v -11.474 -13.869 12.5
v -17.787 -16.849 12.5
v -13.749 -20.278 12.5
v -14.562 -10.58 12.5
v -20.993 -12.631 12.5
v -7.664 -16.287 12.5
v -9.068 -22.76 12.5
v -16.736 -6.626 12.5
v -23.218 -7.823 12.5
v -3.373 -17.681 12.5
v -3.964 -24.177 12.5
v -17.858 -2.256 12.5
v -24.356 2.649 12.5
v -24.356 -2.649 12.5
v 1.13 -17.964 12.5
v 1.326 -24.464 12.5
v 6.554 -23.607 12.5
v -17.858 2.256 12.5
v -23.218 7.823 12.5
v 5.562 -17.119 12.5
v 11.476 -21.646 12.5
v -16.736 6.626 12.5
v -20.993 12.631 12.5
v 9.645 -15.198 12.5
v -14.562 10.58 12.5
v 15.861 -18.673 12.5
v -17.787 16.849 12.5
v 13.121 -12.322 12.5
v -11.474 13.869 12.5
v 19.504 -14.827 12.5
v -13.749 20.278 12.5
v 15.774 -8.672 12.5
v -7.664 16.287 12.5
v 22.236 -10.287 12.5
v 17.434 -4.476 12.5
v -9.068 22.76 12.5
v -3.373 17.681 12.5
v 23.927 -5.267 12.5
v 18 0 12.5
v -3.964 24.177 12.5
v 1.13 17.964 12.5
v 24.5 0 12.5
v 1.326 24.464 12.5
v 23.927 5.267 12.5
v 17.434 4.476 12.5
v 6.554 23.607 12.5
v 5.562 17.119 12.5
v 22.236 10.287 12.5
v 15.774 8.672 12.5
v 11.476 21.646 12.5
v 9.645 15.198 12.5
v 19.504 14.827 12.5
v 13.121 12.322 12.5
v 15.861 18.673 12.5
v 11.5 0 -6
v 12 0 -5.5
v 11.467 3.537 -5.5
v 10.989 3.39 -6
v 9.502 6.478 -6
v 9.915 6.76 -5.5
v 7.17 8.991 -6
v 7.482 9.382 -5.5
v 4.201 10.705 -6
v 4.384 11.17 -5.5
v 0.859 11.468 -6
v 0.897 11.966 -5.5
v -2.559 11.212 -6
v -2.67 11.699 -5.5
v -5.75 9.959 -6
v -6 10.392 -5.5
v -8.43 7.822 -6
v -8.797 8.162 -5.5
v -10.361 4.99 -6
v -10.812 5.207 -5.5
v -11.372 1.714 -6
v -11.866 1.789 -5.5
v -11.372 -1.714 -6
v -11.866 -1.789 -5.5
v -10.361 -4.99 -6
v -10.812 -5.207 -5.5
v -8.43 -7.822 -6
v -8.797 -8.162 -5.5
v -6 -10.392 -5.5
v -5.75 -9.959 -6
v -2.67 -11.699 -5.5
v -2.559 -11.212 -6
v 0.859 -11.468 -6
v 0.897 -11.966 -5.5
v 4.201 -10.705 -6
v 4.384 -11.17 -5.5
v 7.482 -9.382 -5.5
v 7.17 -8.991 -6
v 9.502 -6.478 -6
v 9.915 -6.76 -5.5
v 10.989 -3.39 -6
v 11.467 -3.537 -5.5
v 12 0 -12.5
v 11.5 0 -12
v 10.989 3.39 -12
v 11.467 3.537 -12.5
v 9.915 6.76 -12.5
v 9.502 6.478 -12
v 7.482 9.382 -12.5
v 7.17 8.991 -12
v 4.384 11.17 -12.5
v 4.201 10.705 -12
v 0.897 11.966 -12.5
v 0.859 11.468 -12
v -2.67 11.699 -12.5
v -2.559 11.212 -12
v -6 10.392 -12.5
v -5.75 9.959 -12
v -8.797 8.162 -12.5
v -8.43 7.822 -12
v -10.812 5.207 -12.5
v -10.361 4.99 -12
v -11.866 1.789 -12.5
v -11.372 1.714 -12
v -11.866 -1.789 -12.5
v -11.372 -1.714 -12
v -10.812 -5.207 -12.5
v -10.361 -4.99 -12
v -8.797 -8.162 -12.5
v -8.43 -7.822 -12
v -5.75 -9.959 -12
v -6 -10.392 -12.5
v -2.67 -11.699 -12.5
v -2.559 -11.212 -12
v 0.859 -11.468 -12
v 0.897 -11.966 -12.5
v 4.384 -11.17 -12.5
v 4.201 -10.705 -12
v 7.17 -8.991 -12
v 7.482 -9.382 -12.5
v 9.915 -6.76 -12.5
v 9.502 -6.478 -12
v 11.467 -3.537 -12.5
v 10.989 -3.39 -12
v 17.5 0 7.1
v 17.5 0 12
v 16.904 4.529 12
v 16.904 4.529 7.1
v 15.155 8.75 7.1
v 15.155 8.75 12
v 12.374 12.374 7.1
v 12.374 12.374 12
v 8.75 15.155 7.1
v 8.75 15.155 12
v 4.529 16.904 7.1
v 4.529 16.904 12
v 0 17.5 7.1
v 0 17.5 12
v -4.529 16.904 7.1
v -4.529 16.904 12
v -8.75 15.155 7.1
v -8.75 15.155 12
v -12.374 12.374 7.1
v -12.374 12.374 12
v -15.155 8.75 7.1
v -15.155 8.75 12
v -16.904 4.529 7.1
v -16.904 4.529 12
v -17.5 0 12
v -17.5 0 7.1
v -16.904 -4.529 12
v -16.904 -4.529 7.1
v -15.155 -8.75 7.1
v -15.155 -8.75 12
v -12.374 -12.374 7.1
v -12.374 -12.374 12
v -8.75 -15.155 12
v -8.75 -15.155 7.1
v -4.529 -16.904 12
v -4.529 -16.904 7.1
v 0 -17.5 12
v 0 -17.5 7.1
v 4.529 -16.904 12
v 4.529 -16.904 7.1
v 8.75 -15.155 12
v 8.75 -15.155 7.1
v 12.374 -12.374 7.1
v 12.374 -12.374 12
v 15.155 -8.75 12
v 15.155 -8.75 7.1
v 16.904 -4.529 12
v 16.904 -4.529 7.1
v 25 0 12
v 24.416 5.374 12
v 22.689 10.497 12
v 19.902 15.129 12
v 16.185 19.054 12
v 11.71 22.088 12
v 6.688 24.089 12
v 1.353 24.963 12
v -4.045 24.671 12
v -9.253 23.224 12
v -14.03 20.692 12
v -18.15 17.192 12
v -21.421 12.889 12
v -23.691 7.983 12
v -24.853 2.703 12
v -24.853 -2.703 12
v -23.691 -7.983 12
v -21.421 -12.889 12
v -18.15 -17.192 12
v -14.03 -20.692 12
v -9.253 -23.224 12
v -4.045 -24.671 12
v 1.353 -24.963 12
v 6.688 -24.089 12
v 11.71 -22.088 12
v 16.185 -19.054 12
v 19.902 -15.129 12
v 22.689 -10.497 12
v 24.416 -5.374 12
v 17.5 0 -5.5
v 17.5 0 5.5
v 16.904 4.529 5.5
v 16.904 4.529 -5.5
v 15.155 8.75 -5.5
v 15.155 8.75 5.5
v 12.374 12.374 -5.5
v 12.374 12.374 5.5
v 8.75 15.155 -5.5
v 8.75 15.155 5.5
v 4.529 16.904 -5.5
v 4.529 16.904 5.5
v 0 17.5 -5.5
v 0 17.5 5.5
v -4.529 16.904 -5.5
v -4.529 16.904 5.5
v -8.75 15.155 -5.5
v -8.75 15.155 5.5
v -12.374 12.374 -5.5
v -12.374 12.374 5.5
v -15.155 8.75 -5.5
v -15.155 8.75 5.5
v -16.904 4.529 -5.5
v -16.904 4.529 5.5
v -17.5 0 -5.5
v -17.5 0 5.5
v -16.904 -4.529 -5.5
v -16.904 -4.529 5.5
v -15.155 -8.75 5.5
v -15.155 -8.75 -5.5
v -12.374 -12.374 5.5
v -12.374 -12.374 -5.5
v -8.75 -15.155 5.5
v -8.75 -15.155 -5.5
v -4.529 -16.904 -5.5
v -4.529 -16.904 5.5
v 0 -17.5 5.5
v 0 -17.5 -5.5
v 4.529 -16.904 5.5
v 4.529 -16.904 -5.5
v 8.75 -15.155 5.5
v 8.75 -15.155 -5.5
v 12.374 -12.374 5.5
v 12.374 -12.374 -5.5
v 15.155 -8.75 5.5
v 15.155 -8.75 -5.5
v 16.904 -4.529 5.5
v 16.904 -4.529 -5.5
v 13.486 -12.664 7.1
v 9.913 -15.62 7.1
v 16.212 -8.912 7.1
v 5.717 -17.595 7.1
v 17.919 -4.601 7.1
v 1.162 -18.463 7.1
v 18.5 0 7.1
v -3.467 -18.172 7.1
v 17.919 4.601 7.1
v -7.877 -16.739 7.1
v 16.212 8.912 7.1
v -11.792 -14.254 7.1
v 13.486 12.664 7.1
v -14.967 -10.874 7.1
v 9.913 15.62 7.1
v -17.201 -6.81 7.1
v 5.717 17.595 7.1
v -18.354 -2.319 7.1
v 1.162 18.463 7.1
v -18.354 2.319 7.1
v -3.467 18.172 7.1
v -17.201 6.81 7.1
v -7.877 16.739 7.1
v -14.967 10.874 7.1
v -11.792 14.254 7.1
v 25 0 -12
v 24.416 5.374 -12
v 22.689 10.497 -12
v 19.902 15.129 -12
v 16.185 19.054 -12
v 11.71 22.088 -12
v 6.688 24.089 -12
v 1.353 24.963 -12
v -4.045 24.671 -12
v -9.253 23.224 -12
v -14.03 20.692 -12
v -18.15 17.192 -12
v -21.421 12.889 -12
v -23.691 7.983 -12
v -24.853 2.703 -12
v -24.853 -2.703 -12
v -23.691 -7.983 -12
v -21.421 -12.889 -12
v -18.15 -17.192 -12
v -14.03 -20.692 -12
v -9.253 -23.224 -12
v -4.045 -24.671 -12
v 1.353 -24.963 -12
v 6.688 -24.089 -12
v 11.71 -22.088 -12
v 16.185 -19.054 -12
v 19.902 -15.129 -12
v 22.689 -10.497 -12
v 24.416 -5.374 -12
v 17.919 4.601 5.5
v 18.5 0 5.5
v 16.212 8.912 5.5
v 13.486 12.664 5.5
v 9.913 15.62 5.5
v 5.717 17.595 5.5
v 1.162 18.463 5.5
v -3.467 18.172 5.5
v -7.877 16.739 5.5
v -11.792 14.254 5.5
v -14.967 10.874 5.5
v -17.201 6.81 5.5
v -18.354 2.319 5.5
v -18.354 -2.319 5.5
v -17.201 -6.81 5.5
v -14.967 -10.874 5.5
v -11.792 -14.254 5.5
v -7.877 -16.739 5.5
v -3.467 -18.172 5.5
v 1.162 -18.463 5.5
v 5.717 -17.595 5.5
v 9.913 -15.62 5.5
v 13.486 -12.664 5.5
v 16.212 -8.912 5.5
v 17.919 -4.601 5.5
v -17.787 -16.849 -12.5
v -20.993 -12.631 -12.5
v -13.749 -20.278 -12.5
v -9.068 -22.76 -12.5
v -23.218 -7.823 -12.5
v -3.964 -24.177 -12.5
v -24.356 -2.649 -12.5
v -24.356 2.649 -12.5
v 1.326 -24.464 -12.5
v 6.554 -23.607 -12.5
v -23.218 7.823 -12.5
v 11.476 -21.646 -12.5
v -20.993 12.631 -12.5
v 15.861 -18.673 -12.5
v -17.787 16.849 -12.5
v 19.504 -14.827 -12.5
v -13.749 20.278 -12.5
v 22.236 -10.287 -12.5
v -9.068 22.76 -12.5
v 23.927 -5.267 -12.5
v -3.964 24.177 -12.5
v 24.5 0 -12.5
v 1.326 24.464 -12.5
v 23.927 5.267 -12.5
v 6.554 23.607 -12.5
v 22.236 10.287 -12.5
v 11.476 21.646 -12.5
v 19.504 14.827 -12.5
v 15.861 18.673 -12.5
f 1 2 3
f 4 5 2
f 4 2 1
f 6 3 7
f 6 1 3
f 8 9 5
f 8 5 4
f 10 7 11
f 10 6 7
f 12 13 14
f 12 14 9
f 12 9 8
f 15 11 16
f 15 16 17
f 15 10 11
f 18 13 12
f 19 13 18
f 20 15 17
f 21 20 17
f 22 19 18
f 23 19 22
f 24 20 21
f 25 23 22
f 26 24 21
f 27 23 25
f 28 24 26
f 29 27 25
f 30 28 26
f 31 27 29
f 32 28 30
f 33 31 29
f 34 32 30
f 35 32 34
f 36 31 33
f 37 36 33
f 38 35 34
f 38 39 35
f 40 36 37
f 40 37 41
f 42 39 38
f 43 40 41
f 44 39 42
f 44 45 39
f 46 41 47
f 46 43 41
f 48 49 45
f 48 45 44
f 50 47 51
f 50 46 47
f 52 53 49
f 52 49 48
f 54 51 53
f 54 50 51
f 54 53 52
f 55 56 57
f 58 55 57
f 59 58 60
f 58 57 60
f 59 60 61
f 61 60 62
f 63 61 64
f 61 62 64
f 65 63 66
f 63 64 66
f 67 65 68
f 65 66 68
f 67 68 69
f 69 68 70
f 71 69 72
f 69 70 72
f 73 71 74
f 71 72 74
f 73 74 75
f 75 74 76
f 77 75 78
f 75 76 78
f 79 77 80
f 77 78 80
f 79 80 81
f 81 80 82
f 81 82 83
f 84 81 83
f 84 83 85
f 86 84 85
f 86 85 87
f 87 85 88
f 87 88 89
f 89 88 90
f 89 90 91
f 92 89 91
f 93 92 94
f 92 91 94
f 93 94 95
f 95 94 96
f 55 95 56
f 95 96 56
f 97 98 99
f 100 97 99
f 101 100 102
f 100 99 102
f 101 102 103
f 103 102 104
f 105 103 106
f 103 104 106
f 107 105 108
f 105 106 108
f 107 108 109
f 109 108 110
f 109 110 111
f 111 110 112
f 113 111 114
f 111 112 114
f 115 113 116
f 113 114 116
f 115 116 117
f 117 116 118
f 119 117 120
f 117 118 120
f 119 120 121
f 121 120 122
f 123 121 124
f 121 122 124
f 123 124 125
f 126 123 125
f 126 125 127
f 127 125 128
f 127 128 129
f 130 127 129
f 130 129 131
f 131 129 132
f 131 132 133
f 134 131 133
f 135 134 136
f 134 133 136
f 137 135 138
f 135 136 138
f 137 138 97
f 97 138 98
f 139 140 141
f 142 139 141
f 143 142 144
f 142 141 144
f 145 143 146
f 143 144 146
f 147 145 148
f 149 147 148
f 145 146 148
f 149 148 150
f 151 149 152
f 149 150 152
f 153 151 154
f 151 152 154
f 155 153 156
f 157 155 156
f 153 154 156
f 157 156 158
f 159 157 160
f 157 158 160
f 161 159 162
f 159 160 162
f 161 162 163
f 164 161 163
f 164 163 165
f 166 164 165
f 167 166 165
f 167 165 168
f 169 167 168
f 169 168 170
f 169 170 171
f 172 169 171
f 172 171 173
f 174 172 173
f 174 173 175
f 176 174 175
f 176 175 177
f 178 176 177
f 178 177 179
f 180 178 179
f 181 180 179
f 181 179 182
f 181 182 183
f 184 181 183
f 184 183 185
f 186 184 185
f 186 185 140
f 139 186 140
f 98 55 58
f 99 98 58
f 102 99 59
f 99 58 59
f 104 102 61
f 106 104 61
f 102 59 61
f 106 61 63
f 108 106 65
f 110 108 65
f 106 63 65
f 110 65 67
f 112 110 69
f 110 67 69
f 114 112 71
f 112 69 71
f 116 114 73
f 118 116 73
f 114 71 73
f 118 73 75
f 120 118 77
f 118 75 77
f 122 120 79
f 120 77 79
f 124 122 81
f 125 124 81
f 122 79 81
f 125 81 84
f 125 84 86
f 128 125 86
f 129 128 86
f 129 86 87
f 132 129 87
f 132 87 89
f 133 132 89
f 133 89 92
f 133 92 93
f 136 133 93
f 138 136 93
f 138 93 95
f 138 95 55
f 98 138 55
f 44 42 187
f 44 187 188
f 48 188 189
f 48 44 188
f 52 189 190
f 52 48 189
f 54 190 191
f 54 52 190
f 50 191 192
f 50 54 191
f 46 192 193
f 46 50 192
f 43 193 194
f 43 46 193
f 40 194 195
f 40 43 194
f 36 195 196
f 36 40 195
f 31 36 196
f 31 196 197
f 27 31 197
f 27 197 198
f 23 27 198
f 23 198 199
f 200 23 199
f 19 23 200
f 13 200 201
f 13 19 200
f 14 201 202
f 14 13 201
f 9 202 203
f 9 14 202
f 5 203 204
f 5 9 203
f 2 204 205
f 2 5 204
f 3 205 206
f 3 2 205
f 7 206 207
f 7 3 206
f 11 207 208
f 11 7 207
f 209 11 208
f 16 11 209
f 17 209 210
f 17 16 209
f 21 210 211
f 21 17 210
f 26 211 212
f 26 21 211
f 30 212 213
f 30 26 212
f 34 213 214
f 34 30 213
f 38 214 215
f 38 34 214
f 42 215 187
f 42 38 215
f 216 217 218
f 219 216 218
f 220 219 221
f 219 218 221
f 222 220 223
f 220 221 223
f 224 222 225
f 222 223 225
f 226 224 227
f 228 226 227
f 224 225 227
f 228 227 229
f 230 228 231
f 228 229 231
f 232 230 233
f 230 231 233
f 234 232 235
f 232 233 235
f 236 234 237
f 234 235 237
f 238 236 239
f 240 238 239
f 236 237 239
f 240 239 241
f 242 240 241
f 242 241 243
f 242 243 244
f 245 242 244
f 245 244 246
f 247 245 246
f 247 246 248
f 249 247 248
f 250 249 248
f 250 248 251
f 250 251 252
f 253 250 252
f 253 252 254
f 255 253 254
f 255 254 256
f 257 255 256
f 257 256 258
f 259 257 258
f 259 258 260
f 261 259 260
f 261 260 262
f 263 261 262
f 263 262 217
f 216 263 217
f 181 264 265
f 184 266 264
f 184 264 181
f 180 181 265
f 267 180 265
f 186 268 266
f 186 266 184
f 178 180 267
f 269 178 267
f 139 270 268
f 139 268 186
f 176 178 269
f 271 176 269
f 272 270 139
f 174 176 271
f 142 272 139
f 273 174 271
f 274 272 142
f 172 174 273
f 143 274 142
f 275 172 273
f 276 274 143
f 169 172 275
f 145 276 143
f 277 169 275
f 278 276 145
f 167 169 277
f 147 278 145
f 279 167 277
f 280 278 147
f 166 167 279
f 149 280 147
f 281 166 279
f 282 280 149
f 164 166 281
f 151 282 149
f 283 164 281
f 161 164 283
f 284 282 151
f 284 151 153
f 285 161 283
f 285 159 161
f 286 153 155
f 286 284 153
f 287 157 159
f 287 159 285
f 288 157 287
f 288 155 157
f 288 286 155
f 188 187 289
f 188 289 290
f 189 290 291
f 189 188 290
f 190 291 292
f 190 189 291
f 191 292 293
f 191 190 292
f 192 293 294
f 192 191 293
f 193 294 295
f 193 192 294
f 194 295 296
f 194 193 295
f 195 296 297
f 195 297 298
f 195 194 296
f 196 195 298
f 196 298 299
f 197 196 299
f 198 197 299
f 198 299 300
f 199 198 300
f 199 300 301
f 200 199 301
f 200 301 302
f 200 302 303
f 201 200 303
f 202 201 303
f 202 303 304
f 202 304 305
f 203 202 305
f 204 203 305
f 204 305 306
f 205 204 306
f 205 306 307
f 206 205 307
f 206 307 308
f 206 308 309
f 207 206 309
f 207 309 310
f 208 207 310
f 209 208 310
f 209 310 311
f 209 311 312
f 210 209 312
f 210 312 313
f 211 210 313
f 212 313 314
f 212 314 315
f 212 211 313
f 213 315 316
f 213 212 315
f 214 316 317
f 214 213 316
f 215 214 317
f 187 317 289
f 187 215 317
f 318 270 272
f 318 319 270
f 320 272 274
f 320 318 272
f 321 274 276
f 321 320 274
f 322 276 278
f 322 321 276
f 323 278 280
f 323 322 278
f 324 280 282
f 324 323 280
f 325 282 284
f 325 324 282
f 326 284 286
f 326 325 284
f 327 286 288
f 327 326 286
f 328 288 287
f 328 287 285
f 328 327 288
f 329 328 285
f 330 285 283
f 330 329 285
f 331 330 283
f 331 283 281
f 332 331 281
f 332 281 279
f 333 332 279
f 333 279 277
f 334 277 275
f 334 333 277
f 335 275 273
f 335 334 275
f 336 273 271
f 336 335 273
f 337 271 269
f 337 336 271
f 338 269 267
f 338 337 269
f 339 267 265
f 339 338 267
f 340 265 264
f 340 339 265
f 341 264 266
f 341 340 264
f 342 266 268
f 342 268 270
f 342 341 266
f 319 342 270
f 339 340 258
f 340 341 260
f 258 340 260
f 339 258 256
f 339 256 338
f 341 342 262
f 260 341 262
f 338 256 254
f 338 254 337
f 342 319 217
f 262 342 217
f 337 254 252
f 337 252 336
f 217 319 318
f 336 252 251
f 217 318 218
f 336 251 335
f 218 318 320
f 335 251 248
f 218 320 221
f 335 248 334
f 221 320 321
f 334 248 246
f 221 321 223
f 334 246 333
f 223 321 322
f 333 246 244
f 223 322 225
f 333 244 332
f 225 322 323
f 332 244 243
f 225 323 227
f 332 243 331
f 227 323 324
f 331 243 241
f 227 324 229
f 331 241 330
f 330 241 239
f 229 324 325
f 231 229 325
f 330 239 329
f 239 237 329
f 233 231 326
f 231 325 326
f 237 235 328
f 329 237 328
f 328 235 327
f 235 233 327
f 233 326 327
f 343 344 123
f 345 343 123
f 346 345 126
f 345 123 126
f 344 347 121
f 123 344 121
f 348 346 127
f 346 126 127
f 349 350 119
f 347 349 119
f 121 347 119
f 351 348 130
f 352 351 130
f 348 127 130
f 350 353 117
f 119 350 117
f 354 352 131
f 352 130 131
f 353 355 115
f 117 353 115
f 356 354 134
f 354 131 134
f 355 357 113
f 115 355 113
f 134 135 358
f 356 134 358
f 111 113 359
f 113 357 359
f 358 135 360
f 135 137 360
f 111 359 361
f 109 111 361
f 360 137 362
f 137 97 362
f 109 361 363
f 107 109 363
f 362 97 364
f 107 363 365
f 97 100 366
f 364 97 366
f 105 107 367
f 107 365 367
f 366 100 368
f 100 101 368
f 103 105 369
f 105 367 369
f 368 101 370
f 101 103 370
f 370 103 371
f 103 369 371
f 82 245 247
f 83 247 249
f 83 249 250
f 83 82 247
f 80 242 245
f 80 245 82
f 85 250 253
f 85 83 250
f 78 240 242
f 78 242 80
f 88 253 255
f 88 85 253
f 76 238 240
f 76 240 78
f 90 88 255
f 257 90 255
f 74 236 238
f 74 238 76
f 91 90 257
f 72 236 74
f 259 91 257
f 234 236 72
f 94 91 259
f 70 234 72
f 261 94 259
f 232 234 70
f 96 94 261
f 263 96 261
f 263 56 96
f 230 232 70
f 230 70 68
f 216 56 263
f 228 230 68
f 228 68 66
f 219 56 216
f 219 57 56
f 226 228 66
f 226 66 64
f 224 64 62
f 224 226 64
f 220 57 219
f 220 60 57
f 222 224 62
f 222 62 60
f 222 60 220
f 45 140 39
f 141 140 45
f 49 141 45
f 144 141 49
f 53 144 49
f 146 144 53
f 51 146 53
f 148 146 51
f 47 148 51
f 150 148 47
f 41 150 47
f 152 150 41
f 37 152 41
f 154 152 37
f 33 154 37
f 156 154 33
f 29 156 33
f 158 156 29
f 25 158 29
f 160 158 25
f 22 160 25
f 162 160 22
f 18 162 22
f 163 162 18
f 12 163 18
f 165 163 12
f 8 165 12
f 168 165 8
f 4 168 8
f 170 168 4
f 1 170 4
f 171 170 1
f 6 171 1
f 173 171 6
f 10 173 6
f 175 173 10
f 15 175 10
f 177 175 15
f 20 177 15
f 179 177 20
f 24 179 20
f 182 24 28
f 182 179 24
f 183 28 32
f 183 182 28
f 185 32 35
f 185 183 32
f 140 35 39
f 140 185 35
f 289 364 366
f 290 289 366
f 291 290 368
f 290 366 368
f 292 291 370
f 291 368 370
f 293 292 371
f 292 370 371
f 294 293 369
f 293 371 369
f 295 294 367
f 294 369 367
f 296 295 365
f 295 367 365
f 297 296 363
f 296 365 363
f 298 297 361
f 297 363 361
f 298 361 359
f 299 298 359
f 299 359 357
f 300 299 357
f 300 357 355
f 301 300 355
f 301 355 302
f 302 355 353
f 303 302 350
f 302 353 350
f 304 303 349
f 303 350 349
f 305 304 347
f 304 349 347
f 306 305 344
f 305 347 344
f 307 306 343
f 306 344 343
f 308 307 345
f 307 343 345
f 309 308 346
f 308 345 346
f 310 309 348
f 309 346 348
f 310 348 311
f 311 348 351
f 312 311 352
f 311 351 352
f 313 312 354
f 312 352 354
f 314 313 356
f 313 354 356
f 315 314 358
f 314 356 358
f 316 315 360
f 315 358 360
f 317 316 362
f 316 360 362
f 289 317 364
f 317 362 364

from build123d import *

# Parameters (mm, degrees)
ESBO_O1_R                = 25
RESSALTO_EXTRUS_O1_DEPTH = 12.5
ESBO_O3_R                = 11.5
CORTE_EXTRUS_O1_DEPTH    = 25
ESBO_O4_R                = 17.5
CORTE_EXTRUS_O2_DEPTH    = 18
CHANFRO1_SIZE            = 0.5
ESBO_O5_W                = 1.6
ESBO_O5_H                = 18.5


with BuildPart() as part:
    # Esboço1 → Ressalto-extrusão1 (new, symmetric)
    with BuildSketch(Plane.XY):
        Circle(ESBO_O1_R)
    extrude(amount=RESSALTO_EXTRUS_O1_DEPTH, both=True)

    # Esboço3 → Corte-extrusão1 (cut)
    with BuildSketch(Plane.XY.offset(12.5)):
        Circle(ESBO_O3_R)
    extrude(amount=-CORTE_EXTRUS_O1_DEPTH, mode=Mode.SUBTRACT)

    # Esboço4 → Corte-extrusão2 (cut)
    with BuildSketch(Plane.XY.offset(12.5)):
        Circle(ESBO_O4_R)
    extrude(amount=-CORTE_EXTRUS_O2_DEPTH, mode=Mode.SUBTRACT)

    # Chanfro1
    chanfro1_edges = [part.edges().sort_by_distance(p)[0] for p in [
        (-17.5, 0, 12.5),
        (-11.5, 0, -5.5),
        (-25, 0, -12.5),
        (-25, 0, 12.5),
        (-11.5, 0, -12.5),
    ]]
    chamfer(chanfro1_edges, length=CHANFRO1_SIZE)

    # Esboço5 → Corte-Revolução2 (revolve, cut)
    with BuildSketch(Plane(origin=(0, 0, 0), x_dir=(0, 0, -1), z_dir=(1, 0, 0)), mode=Mode.PRIVATE) as corte_revolu_o2_sk:
        with Locations((-6.3, 9.25)):
            Rectangle(ESBO_O5_W, ESBO_O5_H)
    revolve(corte_revolu_o2_sk.sketch.rotate(Axis((0, 0, 5.5), (0, 0, 1)), 270), axis=Axis((0, 0, 5.5), (0, 0, 1)), mode=Mode.SUBTRACT)


solid = part.part
